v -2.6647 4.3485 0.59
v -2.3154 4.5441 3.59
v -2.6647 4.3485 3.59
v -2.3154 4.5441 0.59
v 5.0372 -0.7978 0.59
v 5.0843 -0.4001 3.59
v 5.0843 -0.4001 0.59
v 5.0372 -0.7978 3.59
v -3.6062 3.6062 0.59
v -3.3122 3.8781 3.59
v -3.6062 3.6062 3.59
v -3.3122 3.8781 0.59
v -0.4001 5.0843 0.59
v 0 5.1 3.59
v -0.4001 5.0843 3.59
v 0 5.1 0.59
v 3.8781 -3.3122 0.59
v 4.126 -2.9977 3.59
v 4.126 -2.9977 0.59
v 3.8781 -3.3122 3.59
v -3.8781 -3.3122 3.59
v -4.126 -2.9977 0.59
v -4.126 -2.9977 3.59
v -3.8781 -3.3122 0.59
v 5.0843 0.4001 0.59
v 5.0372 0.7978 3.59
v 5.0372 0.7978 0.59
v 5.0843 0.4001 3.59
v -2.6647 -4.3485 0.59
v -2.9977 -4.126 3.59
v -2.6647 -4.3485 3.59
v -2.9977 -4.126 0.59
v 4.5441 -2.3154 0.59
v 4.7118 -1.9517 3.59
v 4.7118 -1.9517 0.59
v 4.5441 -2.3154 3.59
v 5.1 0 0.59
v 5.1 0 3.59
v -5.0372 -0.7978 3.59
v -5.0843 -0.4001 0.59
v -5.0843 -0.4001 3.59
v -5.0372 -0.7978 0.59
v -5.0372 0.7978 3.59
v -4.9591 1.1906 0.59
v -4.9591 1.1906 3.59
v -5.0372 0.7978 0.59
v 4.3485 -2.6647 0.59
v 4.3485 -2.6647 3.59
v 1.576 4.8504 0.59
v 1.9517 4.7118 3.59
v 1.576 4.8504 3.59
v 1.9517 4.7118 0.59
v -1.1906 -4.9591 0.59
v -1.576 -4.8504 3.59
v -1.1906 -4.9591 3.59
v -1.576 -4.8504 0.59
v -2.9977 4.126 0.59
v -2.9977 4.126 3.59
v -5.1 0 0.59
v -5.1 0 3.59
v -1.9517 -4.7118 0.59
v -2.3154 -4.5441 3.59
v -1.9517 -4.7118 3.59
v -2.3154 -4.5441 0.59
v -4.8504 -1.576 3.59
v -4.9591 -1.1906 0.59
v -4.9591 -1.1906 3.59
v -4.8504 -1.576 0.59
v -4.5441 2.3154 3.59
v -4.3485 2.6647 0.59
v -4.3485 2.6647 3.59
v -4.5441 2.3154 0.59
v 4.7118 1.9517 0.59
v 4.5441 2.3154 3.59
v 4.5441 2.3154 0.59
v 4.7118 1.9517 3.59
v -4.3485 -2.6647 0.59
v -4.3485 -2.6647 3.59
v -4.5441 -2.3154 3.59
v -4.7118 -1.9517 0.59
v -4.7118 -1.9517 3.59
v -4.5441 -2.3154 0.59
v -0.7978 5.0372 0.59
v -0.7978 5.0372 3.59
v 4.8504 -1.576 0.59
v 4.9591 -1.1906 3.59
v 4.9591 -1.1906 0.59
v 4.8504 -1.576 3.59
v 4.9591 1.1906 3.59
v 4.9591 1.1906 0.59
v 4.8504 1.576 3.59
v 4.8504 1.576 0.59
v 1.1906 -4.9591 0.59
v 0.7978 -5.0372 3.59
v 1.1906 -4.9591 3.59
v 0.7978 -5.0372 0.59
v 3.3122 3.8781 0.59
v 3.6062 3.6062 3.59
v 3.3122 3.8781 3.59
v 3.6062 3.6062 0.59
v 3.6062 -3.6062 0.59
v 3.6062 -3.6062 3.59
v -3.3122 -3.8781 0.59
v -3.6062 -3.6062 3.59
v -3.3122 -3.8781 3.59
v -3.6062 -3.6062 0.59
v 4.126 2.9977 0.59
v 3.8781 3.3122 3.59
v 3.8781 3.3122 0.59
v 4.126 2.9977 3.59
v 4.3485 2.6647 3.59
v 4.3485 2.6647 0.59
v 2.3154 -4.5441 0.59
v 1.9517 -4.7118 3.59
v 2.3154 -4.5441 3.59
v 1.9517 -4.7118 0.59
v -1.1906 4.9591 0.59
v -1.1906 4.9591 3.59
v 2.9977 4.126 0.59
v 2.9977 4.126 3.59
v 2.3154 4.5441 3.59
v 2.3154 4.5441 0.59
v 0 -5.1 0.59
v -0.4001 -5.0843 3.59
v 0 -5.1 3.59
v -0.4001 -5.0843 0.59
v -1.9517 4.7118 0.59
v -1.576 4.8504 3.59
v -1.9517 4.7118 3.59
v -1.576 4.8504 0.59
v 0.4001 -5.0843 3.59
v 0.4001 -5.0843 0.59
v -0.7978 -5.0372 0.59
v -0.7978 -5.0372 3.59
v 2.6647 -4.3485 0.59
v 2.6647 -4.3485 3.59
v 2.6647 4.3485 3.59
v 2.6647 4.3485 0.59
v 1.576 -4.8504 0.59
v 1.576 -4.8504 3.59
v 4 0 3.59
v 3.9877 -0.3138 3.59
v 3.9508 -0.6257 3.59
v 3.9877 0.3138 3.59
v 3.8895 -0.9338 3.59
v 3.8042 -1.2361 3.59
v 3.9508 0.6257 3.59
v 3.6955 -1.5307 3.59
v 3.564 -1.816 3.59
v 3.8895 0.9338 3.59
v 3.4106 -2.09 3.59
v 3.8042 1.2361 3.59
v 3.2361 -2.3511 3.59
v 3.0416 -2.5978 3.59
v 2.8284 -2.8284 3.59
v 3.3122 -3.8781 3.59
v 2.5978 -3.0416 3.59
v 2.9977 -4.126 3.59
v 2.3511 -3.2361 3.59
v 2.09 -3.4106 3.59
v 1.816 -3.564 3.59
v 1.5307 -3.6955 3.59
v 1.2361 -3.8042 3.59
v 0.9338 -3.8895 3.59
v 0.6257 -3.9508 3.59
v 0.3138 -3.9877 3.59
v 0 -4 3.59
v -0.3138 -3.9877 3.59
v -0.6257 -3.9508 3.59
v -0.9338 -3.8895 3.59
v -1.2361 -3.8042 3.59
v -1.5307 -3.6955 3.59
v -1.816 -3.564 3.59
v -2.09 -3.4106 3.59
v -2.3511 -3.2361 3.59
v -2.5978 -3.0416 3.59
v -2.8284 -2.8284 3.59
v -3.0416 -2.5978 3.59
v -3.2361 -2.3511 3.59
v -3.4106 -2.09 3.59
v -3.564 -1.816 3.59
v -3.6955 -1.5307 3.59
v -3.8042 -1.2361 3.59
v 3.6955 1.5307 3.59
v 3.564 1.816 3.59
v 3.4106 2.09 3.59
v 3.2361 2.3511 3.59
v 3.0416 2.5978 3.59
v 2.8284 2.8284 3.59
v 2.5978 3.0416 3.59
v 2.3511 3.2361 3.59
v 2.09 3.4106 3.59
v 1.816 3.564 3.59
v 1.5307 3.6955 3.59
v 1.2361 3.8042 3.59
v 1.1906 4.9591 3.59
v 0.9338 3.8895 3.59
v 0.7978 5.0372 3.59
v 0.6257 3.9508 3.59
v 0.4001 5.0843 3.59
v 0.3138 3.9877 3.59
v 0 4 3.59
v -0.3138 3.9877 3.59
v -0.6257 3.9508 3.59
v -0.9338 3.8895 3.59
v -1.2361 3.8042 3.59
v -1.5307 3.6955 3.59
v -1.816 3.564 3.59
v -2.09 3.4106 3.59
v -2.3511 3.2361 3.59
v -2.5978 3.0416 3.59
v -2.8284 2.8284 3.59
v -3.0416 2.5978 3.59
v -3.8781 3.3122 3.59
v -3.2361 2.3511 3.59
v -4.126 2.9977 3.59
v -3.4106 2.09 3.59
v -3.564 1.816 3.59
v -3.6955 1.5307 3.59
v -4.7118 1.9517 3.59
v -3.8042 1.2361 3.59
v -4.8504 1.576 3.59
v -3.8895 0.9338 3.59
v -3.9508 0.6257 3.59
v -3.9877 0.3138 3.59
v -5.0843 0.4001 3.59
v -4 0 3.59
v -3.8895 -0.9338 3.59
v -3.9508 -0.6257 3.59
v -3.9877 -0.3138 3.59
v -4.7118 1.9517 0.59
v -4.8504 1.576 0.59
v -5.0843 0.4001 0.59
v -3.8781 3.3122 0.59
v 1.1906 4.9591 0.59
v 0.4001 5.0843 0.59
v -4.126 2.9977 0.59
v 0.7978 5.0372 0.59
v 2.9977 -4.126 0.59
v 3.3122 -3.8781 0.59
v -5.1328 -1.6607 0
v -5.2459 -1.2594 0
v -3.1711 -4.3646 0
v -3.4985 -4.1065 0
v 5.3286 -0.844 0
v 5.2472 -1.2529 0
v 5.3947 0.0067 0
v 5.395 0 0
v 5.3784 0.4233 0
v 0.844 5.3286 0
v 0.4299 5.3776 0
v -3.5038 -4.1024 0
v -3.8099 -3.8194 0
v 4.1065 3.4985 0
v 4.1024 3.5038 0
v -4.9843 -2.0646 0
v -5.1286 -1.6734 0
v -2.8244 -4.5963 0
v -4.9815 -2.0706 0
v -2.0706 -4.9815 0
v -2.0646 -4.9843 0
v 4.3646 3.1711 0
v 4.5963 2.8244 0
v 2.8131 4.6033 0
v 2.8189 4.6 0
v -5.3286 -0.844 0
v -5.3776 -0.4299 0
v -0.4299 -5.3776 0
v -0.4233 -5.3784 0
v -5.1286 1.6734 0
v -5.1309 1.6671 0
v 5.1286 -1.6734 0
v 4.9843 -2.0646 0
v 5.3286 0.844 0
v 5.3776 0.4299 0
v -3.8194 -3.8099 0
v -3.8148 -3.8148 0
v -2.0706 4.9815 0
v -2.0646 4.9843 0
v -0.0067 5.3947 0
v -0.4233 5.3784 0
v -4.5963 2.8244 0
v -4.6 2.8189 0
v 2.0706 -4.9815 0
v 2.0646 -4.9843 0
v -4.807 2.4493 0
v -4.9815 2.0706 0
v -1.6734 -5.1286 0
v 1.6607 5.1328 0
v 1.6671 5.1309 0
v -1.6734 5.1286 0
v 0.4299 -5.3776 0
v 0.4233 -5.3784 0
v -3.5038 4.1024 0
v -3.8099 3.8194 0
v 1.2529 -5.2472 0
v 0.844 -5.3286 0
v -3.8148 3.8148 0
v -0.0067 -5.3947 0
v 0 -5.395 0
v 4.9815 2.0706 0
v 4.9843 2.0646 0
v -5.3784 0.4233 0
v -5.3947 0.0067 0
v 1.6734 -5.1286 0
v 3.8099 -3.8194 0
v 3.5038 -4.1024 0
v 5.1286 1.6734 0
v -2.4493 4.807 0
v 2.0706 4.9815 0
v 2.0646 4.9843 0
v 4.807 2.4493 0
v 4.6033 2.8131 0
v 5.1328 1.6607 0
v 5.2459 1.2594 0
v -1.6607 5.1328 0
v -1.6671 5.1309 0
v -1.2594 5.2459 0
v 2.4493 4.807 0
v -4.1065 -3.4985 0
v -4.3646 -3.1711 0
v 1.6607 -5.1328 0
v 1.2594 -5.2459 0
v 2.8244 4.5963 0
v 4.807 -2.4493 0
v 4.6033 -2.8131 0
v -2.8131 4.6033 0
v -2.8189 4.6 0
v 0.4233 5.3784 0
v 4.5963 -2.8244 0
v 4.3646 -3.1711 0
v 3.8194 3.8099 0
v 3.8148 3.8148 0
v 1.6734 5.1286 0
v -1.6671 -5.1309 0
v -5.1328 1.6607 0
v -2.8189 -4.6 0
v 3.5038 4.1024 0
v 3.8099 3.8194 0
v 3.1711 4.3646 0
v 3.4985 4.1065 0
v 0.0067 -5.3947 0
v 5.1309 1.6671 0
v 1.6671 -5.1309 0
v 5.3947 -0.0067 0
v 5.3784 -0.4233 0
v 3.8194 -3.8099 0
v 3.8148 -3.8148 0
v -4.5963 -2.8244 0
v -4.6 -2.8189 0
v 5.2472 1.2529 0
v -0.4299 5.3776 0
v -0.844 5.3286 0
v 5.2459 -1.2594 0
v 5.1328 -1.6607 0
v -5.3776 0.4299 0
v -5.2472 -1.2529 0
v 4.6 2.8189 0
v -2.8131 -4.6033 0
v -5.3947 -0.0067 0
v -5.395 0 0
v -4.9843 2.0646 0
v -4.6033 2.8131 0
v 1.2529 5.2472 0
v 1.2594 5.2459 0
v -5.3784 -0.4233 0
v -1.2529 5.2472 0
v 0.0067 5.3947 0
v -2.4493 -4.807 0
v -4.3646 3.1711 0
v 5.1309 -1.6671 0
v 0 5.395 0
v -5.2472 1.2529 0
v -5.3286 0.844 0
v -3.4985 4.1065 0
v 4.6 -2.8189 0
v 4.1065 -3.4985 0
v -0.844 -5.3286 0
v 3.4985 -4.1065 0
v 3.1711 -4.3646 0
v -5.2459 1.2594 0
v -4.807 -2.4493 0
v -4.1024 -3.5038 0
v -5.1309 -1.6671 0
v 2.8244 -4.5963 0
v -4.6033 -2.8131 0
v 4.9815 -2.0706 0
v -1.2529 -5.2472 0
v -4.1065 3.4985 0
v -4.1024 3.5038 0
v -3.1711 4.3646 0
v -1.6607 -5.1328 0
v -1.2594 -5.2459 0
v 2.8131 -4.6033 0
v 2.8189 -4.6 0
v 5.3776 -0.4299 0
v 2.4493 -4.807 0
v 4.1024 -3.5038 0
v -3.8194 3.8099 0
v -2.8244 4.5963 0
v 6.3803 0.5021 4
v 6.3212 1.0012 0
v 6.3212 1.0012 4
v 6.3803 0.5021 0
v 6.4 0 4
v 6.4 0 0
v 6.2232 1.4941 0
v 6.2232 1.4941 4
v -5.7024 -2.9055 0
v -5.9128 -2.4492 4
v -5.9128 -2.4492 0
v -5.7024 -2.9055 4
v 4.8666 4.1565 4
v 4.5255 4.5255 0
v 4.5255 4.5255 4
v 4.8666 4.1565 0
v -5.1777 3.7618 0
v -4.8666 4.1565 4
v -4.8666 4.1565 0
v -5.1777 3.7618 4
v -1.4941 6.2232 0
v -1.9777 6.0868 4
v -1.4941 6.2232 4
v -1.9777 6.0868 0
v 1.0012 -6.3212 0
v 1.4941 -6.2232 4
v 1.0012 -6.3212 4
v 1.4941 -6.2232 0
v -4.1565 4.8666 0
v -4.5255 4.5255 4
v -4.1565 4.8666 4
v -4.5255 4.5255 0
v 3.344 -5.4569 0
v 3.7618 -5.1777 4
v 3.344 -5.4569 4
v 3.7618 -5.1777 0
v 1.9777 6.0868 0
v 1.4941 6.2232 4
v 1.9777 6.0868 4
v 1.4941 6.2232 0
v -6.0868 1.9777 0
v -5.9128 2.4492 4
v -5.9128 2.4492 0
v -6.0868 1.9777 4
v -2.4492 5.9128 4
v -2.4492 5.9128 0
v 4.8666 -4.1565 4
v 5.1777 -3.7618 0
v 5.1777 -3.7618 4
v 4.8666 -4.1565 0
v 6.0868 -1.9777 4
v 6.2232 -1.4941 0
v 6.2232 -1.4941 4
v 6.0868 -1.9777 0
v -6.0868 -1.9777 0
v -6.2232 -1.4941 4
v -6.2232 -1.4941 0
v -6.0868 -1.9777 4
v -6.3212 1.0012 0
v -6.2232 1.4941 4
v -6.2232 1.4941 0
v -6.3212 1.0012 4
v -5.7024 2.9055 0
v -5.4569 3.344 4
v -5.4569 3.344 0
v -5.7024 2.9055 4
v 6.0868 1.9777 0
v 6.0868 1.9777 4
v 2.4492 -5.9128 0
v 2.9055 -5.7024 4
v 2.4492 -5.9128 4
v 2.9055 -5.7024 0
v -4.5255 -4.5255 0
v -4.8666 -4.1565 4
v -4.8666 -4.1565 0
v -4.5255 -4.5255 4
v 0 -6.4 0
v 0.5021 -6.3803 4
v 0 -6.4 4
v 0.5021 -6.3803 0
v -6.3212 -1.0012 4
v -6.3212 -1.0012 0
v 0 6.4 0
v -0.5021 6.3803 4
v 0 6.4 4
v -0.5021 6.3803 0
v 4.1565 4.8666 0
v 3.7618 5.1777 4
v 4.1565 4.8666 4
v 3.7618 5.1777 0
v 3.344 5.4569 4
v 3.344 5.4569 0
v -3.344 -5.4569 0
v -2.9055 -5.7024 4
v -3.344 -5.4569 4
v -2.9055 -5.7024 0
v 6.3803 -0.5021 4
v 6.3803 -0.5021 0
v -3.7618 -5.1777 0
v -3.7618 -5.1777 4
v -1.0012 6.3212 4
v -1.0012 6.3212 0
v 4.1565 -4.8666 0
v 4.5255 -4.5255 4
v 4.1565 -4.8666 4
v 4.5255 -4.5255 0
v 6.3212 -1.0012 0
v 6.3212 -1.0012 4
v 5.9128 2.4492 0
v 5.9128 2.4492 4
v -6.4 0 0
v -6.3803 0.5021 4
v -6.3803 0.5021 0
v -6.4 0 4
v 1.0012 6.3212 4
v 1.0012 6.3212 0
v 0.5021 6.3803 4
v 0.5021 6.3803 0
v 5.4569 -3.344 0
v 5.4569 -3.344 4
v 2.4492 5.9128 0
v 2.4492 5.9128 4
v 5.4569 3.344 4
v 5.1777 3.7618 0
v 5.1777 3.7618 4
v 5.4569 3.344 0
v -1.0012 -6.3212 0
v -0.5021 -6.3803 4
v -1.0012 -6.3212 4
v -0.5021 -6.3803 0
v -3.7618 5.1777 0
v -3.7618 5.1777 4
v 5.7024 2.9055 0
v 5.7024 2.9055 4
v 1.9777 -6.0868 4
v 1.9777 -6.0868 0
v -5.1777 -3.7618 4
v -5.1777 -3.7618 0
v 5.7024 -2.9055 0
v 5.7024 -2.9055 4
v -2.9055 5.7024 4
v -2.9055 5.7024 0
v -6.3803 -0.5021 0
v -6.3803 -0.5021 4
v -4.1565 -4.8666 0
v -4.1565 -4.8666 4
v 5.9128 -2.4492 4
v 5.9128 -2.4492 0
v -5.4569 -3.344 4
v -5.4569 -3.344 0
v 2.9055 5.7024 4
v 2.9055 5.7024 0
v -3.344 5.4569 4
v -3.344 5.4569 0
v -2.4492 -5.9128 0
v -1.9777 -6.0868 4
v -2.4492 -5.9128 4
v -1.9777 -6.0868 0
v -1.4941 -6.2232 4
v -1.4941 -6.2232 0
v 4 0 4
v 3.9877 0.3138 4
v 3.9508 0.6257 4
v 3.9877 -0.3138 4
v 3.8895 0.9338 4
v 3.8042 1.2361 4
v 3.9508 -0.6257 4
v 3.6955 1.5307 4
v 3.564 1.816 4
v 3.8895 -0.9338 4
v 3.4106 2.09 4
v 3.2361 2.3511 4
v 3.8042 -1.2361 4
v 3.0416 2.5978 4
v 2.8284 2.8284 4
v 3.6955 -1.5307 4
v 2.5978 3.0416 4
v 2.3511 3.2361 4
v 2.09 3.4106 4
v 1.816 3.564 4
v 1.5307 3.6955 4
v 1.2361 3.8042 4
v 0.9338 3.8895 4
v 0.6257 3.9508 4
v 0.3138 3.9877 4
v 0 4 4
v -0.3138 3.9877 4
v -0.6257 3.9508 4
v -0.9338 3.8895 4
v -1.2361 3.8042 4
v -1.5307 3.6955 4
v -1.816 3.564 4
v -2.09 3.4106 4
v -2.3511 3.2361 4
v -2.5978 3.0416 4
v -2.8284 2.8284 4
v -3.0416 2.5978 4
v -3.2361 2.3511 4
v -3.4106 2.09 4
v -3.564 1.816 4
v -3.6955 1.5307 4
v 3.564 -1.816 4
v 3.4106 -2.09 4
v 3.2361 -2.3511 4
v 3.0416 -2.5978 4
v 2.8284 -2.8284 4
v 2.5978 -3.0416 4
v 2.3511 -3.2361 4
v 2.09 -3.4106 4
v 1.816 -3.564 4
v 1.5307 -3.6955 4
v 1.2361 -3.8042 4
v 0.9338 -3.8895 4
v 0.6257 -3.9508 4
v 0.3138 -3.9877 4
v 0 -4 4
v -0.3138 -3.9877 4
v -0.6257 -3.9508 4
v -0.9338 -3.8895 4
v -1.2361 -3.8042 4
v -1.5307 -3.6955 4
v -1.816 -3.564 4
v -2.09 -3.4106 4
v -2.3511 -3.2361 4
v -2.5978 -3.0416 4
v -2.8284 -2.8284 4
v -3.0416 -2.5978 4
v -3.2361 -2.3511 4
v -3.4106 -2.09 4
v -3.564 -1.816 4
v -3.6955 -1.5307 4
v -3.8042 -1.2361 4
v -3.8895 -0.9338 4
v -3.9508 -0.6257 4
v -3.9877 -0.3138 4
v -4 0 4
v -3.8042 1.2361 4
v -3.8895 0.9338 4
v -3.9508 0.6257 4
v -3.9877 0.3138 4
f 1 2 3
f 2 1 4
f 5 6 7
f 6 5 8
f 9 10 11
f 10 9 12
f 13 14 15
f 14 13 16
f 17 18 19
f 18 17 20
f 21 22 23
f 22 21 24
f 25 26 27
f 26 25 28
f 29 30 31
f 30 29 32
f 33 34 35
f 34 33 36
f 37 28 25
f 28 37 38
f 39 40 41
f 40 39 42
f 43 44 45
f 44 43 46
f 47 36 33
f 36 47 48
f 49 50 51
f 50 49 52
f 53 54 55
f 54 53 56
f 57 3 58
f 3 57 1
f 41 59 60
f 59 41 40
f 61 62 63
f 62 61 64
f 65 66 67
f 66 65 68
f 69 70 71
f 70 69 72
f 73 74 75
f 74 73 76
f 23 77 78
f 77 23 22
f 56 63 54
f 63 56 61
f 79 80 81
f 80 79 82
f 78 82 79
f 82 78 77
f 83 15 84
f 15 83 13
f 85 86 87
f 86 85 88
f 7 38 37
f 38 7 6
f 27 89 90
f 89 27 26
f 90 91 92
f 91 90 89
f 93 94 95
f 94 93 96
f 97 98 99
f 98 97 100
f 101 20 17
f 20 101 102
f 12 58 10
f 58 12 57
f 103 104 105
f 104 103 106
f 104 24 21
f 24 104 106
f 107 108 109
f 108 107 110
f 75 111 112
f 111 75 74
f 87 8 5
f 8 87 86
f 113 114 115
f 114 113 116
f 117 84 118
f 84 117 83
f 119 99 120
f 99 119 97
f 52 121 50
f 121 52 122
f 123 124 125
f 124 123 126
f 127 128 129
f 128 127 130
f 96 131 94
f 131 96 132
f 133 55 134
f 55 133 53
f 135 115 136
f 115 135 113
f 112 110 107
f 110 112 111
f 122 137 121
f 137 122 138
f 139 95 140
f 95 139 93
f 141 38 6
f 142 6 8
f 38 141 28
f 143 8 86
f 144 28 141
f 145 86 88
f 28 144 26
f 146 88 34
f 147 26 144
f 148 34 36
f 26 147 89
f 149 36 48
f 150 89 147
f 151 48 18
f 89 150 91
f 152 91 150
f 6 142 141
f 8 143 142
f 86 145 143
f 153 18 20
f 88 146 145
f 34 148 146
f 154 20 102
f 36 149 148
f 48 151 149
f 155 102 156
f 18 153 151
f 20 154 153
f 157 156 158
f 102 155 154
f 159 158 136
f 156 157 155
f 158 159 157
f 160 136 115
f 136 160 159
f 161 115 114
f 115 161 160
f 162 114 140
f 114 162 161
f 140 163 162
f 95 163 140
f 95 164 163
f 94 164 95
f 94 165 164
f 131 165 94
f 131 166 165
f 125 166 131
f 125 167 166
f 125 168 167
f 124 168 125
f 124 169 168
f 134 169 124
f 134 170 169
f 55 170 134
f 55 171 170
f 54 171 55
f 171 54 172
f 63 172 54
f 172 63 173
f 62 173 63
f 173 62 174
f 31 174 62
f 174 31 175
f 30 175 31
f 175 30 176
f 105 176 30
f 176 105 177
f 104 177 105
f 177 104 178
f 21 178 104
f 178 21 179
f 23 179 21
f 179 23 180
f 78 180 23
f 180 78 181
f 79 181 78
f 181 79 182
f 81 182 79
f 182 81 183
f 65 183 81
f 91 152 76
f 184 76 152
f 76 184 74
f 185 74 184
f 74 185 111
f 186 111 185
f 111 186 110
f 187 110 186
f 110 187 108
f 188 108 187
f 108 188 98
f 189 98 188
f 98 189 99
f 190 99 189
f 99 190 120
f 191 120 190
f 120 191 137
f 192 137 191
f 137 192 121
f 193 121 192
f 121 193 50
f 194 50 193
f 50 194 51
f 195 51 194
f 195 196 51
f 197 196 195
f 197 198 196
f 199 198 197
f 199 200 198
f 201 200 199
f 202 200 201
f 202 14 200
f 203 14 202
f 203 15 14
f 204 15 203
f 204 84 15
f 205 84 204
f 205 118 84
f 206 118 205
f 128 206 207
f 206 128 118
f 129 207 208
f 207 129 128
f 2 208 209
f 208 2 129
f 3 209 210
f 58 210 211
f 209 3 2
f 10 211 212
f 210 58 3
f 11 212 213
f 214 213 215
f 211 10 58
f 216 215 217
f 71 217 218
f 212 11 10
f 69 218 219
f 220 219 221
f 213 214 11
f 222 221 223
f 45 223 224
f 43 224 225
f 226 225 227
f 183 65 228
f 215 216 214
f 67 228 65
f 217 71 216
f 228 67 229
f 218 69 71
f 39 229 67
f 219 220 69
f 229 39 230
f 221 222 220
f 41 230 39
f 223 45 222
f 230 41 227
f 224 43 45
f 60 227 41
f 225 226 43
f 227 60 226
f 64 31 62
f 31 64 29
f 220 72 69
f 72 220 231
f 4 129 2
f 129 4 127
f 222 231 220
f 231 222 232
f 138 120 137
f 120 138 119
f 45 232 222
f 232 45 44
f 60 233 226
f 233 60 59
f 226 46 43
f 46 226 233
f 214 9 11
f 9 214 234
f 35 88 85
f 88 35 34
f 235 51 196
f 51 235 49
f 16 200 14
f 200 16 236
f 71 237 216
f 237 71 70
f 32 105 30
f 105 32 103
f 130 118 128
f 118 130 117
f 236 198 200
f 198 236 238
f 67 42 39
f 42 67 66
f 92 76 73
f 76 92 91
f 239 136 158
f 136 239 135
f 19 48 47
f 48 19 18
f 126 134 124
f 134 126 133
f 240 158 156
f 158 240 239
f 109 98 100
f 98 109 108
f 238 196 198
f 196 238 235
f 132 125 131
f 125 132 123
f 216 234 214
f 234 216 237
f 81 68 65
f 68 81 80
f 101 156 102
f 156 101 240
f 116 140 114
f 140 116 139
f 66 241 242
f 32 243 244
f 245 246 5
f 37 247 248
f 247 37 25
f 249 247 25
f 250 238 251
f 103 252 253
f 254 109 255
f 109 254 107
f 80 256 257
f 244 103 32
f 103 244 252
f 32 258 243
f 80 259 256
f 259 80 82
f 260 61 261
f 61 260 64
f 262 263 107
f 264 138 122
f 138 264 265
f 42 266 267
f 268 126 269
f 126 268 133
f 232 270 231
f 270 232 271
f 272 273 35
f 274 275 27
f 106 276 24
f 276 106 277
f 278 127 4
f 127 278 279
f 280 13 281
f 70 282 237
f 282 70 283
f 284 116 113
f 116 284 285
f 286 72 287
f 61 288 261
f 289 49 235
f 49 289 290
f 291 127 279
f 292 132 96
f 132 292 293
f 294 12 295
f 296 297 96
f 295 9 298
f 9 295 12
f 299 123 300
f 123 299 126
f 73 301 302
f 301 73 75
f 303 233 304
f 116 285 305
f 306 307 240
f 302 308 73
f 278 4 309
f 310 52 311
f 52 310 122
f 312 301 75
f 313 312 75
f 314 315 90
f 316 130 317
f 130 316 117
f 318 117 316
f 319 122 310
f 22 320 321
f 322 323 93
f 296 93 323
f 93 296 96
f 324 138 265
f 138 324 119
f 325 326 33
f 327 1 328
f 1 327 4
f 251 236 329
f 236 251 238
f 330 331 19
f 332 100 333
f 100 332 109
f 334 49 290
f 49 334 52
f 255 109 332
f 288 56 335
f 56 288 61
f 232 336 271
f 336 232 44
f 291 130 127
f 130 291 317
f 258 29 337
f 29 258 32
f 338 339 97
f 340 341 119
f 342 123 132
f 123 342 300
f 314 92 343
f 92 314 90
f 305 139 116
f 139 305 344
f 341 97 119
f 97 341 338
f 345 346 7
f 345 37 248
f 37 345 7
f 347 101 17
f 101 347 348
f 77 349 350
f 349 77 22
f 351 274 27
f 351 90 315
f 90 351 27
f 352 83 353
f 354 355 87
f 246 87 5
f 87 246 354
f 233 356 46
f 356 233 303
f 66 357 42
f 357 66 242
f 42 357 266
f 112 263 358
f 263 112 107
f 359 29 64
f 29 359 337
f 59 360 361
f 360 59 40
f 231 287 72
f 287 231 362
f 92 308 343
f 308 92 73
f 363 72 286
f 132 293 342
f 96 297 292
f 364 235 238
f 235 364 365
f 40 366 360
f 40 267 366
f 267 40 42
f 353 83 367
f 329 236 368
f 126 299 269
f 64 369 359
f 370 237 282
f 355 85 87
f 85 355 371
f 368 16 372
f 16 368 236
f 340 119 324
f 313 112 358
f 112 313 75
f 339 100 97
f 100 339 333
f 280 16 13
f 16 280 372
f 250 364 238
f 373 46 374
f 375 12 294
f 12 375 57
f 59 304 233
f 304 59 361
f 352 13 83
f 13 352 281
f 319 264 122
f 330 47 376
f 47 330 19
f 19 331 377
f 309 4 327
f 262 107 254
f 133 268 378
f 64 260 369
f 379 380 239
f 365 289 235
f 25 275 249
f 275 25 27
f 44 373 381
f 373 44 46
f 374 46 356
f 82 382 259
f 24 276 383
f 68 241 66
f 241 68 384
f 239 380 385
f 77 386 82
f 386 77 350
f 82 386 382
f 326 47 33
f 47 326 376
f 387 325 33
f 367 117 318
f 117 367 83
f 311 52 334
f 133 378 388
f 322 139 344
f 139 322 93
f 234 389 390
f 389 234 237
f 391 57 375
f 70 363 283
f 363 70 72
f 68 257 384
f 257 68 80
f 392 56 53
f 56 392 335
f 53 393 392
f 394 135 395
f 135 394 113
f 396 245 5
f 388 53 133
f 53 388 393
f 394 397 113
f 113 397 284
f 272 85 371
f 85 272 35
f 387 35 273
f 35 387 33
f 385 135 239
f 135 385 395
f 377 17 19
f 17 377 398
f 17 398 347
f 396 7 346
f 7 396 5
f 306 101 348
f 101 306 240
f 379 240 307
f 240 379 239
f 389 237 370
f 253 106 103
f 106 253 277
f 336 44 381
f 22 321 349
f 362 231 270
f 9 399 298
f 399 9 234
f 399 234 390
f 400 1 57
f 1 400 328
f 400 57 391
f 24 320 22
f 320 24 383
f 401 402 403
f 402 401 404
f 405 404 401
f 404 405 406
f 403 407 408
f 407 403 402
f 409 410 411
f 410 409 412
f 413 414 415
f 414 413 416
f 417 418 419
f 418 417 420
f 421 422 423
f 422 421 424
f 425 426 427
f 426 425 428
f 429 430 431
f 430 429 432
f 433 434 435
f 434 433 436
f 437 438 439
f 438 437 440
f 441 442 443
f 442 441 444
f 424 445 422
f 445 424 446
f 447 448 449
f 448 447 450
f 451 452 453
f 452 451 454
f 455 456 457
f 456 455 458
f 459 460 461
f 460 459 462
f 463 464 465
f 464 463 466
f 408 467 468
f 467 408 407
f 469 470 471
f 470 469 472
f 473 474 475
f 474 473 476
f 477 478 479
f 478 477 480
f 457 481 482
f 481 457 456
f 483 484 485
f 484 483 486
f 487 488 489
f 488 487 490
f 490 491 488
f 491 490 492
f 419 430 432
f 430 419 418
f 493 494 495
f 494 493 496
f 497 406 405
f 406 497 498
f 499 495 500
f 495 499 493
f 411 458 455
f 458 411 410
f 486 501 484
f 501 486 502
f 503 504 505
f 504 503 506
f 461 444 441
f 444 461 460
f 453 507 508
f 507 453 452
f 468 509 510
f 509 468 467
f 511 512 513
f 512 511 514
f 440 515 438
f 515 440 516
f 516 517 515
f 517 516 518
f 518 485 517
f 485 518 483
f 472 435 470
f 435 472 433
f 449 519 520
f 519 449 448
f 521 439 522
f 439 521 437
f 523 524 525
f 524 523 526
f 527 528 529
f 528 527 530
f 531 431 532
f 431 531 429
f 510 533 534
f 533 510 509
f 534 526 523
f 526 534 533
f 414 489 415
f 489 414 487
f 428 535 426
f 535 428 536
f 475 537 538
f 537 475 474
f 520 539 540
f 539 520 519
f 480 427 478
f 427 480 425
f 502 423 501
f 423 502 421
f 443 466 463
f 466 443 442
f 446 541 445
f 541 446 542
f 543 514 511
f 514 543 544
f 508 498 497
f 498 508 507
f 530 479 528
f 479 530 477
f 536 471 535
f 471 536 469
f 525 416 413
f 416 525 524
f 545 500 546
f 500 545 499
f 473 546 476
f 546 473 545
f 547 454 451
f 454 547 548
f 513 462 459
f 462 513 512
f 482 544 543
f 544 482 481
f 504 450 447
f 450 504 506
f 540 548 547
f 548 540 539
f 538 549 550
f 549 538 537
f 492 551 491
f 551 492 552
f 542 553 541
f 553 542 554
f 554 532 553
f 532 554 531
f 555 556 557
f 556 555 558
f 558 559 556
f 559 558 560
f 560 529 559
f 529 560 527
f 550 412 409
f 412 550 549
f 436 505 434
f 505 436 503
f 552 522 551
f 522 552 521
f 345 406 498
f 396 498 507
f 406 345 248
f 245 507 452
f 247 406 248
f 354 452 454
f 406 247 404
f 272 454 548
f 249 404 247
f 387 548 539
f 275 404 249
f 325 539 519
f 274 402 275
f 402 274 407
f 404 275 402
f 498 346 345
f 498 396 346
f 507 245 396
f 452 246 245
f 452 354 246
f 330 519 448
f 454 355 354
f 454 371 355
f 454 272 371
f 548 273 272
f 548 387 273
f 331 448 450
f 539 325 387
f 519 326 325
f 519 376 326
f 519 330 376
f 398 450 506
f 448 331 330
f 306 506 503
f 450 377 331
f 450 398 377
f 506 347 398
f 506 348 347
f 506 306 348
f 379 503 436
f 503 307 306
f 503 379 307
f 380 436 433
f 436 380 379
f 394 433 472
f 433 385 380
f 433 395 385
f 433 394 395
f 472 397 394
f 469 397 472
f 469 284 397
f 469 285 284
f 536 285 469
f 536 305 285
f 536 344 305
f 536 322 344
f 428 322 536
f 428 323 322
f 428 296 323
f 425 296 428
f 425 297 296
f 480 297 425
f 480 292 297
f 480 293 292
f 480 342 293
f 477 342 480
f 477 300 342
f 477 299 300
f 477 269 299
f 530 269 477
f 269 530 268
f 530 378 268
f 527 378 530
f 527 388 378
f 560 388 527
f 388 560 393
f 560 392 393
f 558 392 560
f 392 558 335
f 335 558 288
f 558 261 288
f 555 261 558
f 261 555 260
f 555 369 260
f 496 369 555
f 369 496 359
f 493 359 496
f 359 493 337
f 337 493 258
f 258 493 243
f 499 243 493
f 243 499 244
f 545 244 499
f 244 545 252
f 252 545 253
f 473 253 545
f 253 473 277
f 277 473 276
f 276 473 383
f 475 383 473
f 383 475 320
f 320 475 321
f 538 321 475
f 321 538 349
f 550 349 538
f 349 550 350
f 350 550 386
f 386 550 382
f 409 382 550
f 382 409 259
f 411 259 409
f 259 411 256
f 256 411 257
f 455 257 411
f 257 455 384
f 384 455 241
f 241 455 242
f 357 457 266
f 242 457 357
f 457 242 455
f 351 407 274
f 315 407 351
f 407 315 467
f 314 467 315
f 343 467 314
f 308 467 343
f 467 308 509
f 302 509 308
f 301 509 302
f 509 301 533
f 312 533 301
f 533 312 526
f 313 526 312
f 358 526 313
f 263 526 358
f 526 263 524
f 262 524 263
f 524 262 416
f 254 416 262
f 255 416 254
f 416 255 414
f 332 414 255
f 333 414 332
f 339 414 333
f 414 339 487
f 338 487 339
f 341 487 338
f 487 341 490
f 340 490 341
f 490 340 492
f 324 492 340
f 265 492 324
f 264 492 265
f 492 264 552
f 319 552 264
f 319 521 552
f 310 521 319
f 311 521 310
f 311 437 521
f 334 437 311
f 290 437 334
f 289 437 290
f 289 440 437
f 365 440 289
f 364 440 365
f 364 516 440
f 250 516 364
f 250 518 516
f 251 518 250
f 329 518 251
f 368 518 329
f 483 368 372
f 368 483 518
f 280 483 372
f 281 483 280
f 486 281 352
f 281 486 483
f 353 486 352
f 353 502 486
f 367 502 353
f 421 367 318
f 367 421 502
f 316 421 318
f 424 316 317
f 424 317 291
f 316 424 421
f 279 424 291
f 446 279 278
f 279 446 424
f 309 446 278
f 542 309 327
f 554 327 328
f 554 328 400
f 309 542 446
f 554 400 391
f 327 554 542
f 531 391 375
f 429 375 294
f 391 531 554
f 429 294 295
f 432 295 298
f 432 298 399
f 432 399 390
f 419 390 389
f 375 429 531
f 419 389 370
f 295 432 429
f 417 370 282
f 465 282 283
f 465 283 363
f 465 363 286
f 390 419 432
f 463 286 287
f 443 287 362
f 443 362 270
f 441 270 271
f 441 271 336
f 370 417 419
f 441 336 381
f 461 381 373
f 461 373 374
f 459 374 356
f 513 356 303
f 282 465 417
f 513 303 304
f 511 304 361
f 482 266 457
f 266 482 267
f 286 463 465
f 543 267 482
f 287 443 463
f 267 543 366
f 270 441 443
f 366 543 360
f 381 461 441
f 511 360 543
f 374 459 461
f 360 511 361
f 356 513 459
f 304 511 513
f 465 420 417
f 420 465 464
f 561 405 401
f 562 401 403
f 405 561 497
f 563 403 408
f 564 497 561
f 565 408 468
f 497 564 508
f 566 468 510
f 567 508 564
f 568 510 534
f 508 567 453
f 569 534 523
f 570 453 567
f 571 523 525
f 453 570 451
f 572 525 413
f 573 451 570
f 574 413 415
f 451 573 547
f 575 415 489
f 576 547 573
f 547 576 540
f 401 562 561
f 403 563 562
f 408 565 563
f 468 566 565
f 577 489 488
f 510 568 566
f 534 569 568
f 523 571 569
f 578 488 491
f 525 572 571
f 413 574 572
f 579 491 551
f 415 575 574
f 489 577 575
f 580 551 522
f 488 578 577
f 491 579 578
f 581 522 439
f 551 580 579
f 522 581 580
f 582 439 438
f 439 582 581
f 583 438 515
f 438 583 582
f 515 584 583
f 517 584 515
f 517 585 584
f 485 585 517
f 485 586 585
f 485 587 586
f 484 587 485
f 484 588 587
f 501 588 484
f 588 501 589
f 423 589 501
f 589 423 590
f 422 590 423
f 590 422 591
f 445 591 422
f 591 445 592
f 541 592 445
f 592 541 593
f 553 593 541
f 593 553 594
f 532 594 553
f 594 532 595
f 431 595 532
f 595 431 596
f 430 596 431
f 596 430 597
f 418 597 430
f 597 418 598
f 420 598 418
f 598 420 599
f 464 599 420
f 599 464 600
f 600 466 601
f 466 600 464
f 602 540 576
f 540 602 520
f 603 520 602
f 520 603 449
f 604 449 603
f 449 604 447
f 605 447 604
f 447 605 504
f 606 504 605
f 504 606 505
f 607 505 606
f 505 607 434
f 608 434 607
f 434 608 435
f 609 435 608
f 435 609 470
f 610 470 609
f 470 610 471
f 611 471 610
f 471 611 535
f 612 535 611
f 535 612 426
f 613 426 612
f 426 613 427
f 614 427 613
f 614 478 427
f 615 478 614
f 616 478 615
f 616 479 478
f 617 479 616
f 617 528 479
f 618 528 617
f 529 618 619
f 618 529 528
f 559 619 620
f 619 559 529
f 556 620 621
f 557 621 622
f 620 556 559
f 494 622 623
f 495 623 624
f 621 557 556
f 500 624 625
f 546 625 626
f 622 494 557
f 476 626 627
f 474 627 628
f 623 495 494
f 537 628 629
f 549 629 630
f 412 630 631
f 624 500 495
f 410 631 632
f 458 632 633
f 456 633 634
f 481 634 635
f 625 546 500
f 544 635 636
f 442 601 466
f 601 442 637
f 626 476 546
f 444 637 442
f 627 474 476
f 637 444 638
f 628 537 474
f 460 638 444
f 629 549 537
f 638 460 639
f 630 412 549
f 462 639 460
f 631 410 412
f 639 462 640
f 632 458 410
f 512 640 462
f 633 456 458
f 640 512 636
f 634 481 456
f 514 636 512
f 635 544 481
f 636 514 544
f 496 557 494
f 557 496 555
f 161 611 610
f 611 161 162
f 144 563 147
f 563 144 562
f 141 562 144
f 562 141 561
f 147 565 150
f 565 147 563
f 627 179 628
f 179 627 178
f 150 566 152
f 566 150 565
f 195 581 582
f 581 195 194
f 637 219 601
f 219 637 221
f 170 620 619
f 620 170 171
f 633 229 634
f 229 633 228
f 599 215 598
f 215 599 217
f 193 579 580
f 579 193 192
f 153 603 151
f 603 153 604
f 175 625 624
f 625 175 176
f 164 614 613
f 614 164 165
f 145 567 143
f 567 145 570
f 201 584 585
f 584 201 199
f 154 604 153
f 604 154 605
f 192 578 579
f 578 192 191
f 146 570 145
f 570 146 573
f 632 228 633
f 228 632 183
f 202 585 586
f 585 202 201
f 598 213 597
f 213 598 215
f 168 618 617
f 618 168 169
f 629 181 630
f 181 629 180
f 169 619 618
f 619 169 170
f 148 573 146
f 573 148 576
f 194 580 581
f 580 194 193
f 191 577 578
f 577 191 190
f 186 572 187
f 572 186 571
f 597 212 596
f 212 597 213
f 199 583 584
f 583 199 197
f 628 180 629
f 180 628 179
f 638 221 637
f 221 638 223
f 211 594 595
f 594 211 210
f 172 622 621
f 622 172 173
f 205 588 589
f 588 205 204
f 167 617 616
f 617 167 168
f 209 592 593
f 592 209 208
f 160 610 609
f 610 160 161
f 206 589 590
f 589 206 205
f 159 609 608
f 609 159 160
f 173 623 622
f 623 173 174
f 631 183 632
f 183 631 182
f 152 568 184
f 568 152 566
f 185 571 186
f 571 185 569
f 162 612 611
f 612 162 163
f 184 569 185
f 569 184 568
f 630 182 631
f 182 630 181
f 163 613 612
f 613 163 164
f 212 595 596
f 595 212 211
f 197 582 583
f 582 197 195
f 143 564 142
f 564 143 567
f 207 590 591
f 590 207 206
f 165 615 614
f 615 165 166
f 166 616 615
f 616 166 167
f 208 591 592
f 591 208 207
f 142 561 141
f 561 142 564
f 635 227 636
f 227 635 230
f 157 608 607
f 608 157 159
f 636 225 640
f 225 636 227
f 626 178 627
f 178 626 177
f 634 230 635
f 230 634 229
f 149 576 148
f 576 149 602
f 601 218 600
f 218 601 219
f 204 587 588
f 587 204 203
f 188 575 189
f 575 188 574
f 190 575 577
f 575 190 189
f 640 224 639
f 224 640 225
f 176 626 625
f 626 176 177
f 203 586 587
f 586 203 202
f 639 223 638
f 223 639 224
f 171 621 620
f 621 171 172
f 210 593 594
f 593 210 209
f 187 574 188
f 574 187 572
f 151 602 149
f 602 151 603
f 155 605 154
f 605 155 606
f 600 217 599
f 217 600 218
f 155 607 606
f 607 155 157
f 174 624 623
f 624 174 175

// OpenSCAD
mr105zz=[10,5,3];
b619_5zz=[13,5,4];

difference()
{
	union()
	{
		dd=b619_5zz.x-0.2;
		cylinder (d=dd,h=b619_5zz.z,$fn=80);
	}
	translate ([0,0,-0.01])
	{
		cylinder (d=mr105zz.x-2,h=b619_5zz.z+0.02,$fn=80);
	}
	
	translate ([0,0,-0.01])
	{
		cut=0.6;
		dd=mr105zz.x+0.2;
		hh=mr105zz.z+0.1+0.5;
		union()
		{
			cylinder (d=dd,h=hh,$fn=80);
			cylinder (d1=dd+cut,d2=dd,h=cut,$fn=80);
		}
	}
}
